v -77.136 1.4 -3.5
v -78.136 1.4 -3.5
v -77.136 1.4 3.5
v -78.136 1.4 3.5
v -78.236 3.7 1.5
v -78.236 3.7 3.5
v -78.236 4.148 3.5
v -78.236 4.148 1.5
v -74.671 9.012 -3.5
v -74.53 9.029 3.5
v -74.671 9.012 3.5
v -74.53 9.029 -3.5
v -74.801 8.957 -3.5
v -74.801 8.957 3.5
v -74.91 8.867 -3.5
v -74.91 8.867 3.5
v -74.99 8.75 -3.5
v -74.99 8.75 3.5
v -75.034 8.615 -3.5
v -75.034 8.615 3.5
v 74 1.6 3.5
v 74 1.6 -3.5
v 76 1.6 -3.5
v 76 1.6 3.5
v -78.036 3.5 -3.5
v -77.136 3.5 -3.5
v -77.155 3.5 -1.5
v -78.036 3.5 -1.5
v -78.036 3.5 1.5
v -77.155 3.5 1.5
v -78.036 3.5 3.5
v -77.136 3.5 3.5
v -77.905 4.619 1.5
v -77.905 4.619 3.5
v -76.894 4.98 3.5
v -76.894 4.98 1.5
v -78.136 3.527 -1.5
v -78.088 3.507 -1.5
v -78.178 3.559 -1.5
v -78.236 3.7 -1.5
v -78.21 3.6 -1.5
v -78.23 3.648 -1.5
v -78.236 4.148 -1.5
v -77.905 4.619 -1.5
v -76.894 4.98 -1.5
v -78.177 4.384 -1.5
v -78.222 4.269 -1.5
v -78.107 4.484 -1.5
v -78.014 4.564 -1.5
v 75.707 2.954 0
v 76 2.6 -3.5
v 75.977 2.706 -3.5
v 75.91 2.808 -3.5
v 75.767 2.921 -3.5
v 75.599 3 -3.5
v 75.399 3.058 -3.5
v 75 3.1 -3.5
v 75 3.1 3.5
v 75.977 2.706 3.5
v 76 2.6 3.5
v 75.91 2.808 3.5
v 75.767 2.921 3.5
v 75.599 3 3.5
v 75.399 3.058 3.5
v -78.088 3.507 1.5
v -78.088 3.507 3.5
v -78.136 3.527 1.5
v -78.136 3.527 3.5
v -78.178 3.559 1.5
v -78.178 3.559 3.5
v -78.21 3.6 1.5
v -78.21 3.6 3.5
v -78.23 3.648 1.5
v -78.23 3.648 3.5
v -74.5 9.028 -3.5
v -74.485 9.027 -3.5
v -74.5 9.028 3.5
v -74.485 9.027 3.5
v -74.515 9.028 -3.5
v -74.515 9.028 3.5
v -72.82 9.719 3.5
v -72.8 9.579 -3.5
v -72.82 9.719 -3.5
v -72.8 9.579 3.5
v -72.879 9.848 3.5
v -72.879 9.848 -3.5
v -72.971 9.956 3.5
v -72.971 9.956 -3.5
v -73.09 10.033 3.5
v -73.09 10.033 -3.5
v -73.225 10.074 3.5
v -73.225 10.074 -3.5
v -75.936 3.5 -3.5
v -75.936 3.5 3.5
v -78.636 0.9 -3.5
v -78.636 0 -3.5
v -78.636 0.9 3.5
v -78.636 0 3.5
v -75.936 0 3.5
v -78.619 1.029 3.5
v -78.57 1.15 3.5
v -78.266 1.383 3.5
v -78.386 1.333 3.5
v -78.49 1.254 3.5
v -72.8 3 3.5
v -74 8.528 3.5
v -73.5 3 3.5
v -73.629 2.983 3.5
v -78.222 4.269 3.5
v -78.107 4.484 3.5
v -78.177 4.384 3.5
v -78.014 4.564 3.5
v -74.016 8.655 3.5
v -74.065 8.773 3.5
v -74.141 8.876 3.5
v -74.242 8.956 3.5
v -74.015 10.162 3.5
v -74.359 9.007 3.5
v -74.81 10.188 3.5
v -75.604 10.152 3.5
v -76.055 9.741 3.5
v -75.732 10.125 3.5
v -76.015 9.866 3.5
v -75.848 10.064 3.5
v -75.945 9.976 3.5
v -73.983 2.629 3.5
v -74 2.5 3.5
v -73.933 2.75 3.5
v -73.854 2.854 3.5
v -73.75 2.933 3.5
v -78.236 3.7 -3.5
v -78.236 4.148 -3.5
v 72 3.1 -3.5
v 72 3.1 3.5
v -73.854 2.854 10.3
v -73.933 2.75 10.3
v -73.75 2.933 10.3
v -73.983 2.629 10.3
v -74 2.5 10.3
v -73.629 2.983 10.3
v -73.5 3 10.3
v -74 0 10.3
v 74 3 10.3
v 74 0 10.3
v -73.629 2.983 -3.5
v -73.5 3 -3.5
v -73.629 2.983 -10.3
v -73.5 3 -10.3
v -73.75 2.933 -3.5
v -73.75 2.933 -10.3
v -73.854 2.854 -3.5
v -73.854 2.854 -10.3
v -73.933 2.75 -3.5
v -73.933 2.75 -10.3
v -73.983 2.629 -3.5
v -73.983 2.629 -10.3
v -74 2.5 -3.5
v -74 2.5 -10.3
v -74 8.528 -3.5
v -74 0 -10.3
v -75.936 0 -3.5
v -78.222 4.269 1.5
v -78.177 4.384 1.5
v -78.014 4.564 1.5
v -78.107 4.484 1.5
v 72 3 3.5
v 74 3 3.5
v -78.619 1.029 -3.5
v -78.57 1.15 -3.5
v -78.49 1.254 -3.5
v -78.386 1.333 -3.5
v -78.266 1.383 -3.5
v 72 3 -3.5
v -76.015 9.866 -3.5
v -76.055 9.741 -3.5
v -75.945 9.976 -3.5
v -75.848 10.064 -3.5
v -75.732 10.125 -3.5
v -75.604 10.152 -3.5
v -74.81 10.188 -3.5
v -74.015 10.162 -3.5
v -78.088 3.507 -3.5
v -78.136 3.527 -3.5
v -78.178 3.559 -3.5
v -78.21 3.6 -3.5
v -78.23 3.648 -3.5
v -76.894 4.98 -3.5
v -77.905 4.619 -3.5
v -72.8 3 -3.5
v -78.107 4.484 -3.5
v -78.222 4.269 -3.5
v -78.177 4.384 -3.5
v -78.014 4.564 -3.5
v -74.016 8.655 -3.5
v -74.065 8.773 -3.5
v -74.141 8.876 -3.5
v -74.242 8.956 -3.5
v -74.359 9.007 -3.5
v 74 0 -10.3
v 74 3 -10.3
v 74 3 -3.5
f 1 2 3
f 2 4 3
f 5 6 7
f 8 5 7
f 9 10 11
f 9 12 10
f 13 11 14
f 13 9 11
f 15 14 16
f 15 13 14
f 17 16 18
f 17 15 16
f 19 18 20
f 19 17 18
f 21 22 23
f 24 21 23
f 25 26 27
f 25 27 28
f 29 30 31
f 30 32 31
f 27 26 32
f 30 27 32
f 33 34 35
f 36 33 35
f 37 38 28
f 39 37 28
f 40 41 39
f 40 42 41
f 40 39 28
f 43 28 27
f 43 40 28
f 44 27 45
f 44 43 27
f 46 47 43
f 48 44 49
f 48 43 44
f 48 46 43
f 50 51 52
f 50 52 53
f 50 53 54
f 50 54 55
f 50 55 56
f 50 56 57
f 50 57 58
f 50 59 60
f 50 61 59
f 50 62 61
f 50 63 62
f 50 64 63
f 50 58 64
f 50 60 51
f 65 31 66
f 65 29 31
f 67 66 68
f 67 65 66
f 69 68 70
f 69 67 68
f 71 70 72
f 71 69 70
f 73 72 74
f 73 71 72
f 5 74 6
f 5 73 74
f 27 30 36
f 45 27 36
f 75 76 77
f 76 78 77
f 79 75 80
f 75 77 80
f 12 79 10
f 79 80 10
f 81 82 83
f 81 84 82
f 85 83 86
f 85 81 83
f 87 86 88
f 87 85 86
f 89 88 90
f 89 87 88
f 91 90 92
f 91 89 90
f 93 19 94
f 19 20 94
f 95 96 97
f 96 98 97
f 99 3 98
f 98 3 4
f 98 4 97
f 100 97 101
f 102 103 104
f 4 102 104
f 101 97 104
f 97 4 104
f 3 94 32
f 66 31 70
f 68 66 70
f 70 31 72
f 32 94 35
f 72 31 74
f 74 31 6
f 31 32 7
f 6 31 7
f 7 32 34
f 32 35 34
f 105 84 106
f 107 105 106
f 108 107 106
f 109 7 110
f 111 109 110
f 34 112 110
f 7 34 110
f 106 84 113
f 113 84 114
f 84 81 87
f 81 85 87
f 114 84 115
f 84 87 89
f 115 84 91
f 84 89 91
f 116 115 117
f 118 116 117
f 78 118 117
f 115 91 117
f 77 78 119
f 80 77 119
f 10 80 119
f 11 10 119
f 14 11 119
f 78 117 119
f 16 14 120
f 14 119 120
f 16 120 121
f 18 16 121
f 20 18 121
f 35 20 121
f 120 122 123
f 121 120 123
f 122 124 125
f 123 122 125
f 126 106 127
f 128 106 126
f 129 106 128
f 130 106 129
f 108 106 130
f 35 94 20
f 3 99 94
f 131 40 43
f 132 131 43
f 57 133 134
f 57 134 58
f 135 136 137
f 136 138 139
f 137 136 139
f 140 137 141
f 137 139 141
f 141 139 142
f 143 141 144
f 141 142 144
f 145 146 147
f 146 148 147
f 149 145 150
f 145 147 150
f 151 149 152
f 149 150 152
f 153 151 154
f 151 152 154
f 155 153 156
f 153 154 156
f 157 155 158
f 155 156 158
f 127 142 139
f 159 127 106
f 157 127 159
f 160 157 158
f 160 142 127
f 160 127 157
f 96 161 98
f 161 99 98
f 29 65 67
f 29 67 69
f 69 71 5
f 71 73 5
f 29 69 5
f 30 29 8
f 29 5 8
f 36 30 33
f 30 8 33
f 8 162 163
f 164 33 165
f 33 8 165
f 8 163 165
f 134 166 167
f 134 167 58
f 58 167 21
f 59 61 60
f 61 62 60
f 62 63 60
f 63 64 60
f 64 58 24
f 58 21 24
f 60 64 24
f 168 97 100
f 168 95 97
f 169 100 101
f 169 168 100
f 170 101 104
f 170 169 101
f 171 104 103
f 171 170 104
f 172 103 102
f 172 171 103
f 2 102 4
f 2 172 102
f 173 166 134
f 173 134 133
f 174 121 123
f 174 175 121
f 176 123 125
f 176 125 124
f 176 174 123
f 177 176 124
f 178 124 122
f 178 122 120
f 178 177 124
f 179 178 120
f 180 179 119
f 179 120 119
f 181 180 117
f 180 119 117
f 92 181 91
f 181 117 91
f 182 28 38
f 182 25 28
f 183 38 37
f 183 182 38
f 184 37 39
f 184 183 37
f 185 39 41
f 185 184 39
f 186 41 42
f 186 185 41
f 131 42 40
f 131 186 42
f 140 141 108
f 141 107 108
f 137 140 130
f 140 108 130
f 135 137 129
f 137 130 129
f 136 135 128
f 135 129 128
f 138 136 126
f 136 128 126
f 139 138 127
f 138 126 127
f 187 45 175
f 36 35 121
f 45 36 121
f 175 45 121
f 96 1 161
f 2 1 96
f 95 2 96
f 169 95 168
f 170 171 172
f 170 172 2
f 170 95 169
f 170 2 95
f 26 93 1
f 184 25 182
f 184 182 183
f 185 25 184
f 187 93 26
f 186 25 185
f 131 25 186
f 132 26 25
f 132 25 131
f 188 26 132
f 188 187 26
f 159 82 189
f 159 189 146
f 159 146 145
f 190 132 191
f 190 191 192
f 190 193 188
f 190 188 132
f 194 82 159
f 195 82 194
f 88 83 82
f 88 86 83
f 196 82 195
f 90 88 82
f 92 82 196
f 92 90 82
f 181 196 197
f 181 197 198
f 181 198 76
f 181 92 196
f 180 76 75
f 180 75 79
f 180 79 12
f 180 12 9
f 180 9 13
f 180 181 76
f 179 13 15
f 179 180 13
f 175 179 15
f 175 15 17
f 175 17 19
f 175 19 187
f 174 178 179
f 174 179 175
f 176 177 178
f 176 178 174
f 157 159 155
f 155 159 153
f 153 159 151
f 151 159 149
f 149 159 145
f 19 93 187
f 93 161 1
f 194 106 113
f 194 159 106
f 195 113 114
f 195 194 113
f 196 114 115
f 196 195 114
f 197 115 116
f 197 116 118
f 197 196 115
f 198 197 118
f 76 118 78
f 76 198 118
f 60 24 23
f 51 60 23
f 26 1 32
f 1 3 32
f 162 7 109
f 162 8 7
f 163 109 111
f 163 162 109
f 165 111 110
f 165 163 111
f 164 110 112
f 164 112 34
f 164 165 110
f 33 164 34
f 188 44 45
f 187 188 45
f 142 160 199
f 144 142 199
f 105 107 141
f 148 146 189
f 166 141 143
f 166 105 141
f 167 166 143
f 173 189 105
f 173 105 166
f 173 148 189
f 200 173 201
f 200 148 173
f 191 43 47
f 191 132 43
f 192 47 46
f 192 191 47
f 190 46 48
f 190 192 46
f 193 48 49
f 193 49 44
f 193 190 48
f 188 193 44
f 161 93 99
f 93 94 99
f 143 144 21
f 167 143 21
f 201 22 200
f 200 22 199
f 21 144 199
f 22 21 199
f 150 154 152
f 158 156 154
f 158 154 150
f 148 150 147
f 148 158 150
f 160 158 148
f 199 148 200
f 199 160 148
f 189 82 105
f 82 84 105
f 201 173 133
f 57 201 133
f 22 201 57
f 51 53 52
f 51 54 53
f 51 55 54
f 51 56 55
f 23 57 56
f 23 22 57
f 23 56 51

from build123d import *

# Parameters (mm, degrees)
SKETCH_1_W          = 148
SKETCH_1_H          = 20.6
EXTRUDE_1_DEPTH     = 3
EXTRUDE_START       = -1.4
SKETCH_2_W          = 4
SKETCH_2_H          = 7
EXTRUDE_2_DEPTH     = 1.5
EXTRUDE_START_2     = -10.3
EXTRUDE_4_DEPTH     = 3.5
FILLET_2_SIZE       = 1
FILLET_2_SIZE_2     = 0.5
CUT_EXTRUDE_1_REACH = 156.915
SKETCH_6_W          = 3
SKETCH_6_H          = 1.48026825
FILLET_3_R          = 0.5
FILLET_4_R          = 0.2


with BuildPart() as part:
    # 草图1 → 凸台-拉伸1 (new body)
    with BuildSketch(Plane(origin=(0, 0, 0), x_dir=(1, 0, 0), z_dir=(0, 1, 0))):
        Rectangle(SKETCH_1_W, SKETCH_1_H)
    extrude(amount=EXTRUDE_1_DEPTH)

    # 草图2 → 凸台-拉伸2 (add)
    with BuildSketch(Plane(origin=(0, 3, 0), x_dir=(1, 0, 0), z_dir=(0, 1, 0)).offset(EXTRUDE_START)):
        with Locations((74, 0)):
            Rectangle(SKETCH_2_W, SKETCH_2_H)
    extrude(amount=EXTRUDE_2_DEPTH)

    # 草图5 → 凸台-拉伸4 (add, symmetric)
    with BuildSketch(Plane.XY.offset(10.3).offset(EXTRUDE_START_2)):
        with BuildLine():
            Line((-74, 3), (-74, 9))
            ThreePointArc((-74, 9), (-74.480432289, 9.027171941), (-74.961629872, 9.02871601))
            Line((-74.961629872, 9.02871601), (-75.936491673, 3.5))
            Line((-75.936491673, 3.5), (-75.936491673, 0))
            Line((-75.936491673, 0), (-77.2, 0))
            Line((-77.2, 0), (-78.636491673, 0))
            Line((-78.636491673, 0), (-78.636491673, 1.4))
            Line((-78.636491673, 1.4), (-77.136491673, 1.4))
            Line((-77.136491673, 1.4), (-77.136491673, 3.5))
            Line((-77.136491673, 3.5), (-78.236491673, 3.5))
            Line((-78.236491673, 3.5), (-78.236491673, 4.5))
            Line((-78.236491673, 4.5), (-76.893992376, 4.98026825))
            Line((-76.893992376, 4.98026825), (-75.98900028, 10.112733474))
            ThreePointArc((-75.98900028, 10.112733474), (-74.390059228, 10.181991094), (-72.8, 10))
            Line((-72.8, 10), (-72.8, 3))
            Line((-72.8, 3), (-74, 3))
        make_face()
    extrude(amount=EXTRUDE_4_DEPTH, both=True)

    # 圆角2
    # an asymmetric fillet: 1, 0.5 mm, written as the material it takes off along each edge
    with BuildSketch(Plane(origin=(76, 3.1, -6), x_dir=(-1, 0, 0), z_dir=(0, 0, 1))) as fillet_2_piece_1:
        with BuildLine():
            Bezier((FILLET_2_SIZE, 0), (0, 0), (0, FILLET_2_SIZE_2), weights=[1, 0.707106781, 1])
            Line((0, FILLET_2_SIZE_2), (0, 0))
            Line((0, 0), (FILLET_2_SIZE, 0))
        make_face()
    extrude(amount=12, mode=Mode.SUBTRACT)

    # 切除-拉伸1: up to this plane
    cut_extrude_1_end = Plane(origin=(-61993.202735843, -351139.85584642, 3.5), z_dir=(0.984807753012209, -0.17364817766692522, 0))
    # 草图6 → 切除-拉伸1 (cut, up to the surface)
    with BuildSketch(Plane.ZY.offset(78.236491673), mode=Mode.PRIVATE) as cut_extrude_1_sk1:
        with Locations((0, 4.240134125)):
            Rectangle(SKETCH_6_W, SKETCH_6_H)
    cut_extrude_1_tool1 = split(extrude(cut_extrude_1_sk1.sketch, amount=-CUT_EXTRUDE_1_REACH, mode=Mode.PRIVATE), bisect_by=cut_extrude_1_end, keep=Keep.BOTH, mode=Mode.PRIVATE)
    add(cut_extrude_1_tool1.solids().sort_by_distance((-78.236492, 4.240134, 0))[0], mode=Mode.SUBTRACT)

    # 圆角3
    fillet_3_edges = [part.edges().sort_by_distance(p)[0] for p in [
        (-74, 3, -6.9),
        (-74, 3, 6.9),
        (-74.961629872, 9.02871601, 0),
        (-74, 9, 0),
        (-72.8, 10, 0),
        (-75.98900028, 10.112733474, 0),
        (-78.236491673, 4.5, 2.5),
        (-78.636491673, 1.4, 0),
        (-78.236491673, 4.5, -2.5),
    ]]
    fillet(fillet_3_edges, radius=FILLET_3_R)

    # 圆角4
    fillet_4_edges = [part.edges().sort_by_distance(p)[0] for p in [
        (-78.236491673, 3.5, 2.5),
        (-78.236491673, 3.5, -2.5),
    ]]
    fillet(fillet_4_edges, radius=FILLET_4_R)


solid = part.part
